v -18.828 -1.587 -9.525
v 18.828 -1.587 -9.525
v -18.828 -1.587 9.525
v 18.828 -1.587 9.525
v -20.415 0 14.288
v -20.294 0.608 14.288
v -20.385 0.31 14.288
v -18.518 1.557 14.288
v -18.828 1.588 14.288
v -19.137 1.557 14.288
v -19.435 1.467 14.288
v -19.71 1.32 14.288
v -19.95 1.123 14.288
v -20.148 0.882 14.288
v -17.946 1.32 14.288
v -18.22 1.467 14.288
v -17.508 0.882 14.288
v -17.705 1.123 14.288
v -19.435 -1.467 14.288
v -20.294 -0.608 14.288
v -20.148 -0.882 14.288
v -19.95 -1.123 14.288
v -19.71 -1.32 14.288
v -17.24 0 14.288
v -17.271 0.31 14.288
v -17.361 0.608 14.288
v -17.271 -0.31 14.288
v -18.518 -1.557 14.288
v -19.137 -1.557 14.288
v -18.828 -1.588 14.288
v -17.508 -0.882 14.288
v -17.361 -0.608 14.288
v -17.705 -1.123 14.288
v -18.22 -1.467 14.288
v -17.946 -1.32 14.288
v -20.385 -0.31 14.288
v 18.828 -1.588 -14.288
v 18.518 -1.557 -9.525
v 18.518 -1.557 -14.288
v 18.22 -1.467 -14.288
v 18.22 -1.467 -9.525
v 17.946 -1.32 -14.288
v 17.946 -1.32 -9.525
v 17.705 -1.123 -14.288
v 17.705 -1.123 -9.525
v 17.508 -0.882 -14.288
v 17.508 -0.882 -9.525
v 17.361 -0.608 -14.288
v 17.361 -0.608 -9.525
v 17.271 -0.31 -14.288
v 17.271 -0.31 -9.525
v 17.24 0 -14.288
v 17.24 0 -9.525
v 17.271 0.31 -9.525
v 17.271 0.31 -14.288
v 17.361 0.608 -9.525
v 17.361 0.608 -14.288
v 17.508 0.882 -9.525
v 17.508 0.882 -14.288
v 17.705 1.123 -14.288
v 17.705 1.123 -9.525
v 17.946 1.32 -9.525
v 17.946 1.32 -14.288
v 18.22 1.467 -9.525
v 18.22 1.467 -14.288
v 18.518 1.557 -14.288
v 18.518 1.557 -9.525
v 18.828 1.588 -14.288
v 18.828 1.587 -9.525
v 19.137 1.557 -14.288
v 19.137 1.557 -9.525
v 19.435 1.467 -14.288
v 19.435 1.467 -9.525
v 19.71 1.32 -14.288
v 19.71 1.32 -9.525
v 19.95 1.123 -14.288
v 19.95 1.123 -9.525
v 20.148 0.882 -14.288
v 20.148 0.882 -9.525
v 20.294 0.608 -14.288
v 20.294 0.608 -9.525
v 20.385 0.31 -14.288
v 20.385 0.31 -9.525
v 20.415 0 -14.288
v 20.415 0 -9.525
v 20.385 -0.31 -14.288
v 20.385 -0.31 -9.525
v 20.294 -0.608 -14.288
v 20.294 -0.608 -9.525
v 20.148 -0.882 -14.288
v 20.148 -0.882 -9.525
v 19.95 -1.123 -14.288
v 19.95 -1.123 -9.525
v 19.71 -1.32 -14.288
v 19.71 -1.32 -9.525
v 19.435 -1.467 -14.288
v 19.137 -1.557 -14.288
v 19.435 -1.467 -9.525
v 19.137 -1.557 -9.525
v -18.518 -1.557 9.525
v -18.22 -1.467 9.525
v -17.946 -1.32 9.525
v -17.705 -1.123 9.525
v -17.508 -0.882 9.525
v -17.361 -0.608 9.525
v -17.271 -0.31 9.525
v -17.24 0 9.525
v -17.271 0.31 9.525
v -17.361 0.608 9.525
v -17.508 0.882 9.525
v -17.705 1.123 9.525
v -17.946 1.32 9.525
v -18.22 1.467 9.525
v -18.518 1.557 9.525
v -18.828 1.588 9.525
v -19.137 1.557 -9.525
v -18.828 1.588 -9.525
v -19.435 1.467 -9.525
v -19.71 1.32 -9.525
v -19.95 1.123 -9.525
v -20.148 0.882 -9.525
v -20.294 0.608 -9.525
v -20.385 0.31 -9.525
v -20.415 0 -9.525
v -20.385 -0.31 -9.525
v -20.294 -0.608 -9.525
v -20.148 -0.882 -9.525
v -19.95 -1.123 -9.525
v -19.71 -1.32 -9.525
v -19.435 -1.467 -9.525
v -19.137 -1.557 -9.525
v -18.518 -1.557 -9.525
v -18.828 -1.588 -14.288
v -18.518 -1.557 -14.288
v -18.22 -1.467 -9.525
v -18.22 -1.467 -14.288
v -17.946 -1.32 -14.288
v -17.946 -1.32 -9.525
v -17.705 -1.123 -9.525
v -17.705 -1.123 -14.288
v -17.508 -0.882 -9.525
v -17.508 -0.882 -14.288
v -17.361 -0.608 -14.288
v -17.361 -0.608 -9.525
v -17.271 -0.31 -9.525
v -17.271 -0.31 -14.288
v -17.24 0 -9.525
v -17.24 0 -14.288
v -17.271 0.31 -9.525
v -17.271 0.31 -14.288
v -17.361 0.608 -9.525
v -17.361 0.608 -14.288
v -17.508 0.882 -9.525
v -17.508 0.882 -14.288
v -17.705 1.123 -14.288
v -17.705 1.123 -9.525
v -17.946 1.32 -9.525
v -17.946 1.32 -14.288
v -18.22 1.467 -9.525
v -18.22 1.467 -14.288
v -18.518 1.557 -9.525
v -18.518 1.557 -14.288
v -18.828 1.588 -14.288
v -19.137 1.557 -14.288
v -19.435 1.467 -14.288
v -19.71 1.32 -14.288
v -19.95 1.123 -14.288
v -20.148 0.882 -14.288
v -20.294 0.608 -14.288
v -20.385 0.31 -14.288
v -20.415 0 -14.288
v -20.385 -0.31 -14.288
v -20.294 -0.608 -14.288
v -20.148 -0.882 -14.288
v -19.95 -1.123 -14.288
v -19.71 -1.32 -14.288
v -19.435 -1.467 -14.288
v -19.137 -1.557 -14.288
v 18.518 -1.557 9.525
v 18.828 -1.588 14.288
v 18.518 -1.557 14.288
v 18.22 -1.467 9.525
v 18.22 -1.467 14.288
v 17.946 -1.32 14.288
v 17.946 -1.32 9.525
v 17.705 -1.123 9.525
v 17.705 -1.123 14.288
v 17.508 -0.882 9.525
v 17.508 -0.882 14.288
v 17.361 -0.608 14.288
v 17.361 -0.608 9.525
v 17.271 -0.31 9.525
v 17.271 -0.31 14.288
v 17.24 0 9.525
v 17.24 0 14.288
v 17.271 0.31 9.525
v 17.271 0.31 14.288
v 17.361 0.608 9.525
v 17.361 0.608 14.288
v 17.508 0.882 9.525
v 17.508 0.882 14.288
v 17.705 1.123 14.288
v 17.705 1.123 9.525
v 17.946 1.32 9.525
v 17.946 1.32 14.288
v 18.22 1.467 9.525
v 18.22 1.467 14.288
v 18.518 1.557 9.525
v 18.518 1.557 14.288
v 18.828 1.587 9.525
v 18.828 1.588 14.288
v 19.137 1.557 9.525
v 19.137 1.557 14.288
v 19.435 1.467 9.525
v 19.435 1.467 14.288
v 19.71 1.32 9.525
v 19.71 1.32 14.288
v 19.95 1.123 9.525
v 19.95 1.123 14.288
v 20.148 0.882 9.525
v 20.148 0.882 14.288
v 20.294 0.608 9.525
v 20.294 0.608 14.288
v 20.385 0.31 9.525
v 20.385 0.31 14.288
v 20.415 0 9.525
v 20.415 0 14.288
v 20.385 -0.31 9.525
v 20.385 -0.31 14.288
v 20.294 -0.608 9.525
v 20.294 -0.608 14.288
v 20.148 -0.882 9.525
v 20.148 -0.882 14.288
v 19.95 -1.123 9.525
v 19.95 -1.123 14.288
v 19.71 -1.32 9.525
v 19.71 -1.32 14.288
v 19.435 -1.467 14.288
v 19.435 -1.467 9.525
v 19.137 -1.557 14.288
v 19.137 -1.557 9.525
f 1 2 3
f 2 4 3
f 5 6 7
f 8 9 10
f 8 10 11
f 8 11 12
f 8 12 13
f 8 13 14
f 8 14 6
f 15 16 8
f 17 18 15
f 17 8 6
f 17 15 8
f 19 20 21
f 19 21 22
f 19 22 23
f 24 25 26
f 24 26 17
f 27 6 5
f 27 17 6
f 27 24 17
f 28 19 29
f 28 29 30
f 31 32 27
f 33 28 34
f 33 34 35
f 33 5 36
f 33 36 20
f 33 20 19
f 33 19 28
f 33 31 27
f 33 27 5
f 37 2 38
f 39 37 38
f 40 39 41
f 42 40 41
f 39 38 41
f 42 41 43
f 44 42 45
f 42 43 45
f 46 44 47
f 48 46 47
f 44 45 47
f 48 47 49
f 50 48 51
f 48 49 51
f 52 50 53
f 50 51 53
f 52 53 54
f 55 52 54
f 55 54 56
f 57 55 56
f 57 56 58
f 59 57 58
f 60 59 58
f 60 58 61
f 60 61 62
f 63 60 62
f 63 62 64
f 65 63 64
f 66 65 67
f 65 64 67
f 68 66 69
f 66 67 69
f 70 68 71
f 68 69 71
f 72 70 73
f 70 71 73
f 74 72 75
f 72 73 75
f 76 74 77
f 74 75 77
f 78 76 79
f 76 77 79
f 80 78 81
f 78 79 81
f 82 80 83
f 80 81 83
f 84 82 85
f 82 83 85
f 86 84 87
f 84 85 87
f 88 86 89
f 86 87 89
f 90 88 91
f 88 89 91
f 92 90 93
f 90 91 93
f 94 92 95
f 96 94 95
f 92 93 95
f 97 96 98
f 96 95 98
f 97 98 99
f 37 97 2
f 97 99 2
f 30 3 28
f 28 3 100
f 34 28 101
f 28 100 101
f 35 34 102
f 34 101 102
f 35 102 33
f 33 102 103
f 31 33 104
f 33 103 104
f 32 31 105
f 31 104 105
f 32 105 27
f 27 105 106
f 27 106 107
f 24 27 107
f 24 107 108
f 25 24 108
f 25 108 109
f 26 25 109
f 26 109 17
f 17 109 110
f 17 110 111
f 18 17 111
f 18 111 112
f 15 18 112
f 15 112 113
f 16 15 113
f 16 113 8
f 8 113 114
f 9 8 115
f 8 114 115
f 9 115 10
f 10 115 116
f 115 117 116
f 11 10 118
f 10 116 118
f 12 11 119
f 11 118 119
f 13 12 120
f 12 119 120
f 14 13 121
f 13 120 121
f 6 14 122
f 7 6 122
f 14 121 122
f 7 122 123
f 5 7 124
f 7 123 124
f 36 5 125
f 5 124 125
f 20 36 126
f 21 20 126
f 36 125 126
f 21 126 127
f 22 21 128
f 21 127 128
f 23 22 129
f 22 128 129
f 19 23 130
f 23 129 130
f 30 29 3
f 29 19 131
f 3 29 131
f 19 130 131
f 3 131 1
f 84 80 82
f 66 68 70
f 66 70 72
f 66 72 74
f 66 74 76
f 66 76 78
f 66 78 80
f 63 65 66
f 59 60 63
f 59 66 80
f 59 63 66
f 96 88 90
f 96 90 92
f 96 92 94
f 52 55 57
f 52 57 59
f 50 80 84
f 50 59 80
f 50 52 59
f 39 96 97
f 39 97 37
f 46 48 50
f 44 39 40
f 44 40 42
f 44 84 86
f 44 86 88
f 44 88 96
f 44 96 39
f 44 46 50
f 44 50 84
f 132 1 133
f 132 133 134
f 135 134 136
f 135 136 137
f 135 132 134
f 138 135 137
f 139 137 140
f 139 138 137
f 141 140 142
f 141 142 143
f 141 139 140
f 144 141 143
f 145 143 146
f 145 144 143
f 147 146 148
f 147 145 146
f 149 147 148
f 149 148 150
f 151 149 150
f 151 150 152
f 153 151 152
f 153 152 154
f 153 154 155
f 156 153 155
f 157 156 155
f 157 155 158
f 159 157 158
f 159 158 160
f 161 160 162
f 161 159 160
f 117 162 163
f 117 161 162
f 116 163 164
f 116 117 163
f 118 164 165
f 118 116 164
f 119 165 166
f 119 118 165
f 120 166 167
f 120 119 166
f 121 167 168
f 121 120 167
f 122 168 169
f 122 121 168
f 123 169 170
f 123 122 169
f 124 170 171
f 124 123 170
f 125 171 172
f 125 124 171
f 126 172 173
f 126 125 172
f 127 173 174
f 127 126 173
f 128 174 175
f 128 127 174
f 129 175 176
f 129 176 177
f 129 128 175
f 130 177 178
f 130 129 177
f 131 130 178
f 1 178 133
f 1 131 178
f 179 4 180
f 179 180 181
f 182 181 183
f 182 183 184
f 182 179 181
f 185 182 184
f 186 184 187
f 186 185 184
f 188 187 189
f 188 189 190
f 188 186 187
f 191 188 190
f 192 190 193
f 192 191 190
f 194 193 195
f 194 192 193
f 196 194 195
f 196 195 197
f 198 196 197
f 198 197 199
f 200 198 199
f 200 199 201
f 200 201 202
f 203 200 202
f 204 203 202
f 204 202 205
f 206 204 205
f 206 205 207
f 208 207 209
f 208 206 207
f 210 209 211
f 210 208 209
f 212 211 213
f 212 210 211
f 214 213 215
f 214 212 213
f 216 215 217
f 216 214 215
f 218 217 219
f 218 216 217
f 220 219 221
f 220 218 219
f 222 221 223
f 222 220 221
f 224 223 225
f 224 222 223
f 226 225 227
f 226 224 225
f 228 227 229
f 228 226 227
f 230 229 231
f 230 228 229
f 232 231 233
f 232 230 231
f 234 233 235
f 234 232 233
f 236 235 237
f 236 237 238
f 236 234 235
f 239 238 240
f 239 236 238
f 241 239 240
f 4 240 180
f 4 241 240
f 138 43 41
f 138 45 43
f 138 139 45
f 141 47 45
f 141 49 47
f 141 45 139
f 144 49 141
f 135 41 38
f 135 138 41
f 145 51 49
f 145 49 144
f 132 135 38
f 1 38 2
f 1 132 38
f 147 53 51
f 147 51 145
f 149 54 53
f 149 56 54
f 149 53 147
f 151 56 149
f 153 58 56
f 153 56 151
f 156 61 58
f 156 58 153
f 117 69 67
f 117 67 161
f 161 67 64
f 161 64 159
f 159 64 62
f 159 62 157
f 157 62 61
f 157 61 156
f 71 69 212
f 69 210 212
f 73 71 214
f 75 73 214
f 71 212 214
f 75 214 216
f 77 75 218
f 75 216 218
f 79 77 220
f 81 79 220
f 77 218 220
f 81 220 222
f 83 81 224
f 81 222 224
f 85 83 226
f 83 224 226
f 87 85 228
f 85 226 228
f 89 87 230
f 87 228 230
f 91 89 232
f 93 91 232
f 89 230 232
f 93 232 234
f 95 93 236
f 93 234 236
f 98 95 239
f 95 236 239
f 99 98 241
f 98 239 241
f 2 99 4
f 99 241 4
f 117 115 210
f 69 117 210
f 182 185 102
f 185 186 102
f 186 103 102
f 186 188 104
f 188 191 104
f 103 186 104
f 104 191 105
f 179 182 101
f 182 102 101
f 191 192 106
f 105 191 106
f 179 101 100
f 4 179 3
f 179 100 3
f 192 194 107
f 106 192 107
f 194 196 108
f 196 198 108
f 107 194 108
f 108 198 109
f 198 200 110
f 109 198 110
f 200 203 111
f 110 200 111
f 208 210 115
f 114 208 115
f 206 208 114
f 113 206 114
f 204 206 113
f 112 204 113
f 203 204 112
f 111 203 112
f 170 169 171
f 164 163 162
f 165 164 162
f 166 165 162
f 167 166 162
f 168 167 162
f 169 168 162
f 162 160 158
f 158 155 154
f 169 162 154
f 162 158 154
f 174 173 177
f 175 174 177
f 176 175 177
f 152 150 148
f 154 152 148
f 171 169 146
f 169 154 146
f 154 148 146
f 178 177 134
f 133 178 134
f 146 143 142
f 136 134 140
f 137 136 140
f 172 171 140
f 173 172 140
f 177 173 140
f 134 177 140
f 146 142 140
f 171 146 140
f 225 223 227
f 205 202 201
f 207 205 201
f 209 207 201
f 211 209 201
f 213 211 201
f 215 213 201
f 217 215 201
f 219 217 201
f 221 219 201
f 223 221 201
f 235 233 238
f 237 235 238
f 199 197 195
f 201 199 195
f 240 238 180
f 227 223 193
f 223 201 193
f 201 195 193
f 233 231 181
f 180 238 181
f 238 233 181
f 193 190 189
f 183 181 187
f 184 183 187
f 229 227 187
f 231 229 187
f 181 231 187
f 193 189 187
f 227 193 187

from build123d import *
from build123d.topology import SkipClean

# Parameters (mm, degrees)
BOSS_EXTRUDE1_DEPTH     = 9.525
SKETCH3_R               = 1.5875
BOSS_EXTRUDE3_DEPTH     = 4.7625
MIRROR2_COPY_1_SKETCH_R = 1.5875
MIRROR2_COPY_1_DEPTH    = 4.7625


with BuildPart() as part:
    # Sketch1 → Boss-Extrude1 (new body, symmetric)
    with BuildSketch(Plane.XY):
        with BuildLine():
            Line((-18.82775, 1.5875), (18.82775, 1.5875))
            ThreePointArc((18.82775, 1.5875), (20.41525, 0), (18.82775, -1.5875))
            Line((18.82775, -1.5875), (-18.82775, -1.5875))
            ThreePointArc((-18.82775, -1.5875), (-20.41525, 0), (-18.82775, 1.5875))
        make_face()
    extrude(amount=BOSS_EXTRUDE1_DEPTH, both=True)

    # Sketch3 → Boss-Extrude3 (add)
    with BuildSketch(Plane.XY.offset(9.525)):
        with Locations(Location((-18.82775, 0, 0), (0, 0, 270))):  # turned: the seam where the file's is
            Circle(SKETCH3_R)
    boss_extrude3 = extrude(amount=BOSS_EXTRUDE3_DEPTH)

    # Mirror1: Boss-Extrude3 across plane
    with SkipClean():  # keep this step's faces unmerged: merging them makes the solid invalid here
        add(boss_extrude3.mirror(Plane(origin=(0, 0, 0), x_dir=(0, 0, 1), z_dir=(1, 0, 0))))

    # Mirror2: Boss-Extrude3 across plane
    with SkipClean():  # keep this step's faces unmerged: merging them makes the solid invalid here
        add(boss_extrude3.mirror(Plane.XY))

    # Mirror2 copy 1 sketch → Mirror2 copy 1 (add)
    with BuildSketch(Plane(origin=(0, 0, -9.525), x_dir=(-1, 0, 0), z_dir=(0, 0, -1))):
        with Locations(Location((-18.82775, 0, 0), (0, 0, 270))):  # turned: the seam where the file's is
            Circle(MIRROR2_COPY_1_SKETCH_R)
    extrude(amount=MIRROR2_COPY_1_DEPTH)


solid = part.part
